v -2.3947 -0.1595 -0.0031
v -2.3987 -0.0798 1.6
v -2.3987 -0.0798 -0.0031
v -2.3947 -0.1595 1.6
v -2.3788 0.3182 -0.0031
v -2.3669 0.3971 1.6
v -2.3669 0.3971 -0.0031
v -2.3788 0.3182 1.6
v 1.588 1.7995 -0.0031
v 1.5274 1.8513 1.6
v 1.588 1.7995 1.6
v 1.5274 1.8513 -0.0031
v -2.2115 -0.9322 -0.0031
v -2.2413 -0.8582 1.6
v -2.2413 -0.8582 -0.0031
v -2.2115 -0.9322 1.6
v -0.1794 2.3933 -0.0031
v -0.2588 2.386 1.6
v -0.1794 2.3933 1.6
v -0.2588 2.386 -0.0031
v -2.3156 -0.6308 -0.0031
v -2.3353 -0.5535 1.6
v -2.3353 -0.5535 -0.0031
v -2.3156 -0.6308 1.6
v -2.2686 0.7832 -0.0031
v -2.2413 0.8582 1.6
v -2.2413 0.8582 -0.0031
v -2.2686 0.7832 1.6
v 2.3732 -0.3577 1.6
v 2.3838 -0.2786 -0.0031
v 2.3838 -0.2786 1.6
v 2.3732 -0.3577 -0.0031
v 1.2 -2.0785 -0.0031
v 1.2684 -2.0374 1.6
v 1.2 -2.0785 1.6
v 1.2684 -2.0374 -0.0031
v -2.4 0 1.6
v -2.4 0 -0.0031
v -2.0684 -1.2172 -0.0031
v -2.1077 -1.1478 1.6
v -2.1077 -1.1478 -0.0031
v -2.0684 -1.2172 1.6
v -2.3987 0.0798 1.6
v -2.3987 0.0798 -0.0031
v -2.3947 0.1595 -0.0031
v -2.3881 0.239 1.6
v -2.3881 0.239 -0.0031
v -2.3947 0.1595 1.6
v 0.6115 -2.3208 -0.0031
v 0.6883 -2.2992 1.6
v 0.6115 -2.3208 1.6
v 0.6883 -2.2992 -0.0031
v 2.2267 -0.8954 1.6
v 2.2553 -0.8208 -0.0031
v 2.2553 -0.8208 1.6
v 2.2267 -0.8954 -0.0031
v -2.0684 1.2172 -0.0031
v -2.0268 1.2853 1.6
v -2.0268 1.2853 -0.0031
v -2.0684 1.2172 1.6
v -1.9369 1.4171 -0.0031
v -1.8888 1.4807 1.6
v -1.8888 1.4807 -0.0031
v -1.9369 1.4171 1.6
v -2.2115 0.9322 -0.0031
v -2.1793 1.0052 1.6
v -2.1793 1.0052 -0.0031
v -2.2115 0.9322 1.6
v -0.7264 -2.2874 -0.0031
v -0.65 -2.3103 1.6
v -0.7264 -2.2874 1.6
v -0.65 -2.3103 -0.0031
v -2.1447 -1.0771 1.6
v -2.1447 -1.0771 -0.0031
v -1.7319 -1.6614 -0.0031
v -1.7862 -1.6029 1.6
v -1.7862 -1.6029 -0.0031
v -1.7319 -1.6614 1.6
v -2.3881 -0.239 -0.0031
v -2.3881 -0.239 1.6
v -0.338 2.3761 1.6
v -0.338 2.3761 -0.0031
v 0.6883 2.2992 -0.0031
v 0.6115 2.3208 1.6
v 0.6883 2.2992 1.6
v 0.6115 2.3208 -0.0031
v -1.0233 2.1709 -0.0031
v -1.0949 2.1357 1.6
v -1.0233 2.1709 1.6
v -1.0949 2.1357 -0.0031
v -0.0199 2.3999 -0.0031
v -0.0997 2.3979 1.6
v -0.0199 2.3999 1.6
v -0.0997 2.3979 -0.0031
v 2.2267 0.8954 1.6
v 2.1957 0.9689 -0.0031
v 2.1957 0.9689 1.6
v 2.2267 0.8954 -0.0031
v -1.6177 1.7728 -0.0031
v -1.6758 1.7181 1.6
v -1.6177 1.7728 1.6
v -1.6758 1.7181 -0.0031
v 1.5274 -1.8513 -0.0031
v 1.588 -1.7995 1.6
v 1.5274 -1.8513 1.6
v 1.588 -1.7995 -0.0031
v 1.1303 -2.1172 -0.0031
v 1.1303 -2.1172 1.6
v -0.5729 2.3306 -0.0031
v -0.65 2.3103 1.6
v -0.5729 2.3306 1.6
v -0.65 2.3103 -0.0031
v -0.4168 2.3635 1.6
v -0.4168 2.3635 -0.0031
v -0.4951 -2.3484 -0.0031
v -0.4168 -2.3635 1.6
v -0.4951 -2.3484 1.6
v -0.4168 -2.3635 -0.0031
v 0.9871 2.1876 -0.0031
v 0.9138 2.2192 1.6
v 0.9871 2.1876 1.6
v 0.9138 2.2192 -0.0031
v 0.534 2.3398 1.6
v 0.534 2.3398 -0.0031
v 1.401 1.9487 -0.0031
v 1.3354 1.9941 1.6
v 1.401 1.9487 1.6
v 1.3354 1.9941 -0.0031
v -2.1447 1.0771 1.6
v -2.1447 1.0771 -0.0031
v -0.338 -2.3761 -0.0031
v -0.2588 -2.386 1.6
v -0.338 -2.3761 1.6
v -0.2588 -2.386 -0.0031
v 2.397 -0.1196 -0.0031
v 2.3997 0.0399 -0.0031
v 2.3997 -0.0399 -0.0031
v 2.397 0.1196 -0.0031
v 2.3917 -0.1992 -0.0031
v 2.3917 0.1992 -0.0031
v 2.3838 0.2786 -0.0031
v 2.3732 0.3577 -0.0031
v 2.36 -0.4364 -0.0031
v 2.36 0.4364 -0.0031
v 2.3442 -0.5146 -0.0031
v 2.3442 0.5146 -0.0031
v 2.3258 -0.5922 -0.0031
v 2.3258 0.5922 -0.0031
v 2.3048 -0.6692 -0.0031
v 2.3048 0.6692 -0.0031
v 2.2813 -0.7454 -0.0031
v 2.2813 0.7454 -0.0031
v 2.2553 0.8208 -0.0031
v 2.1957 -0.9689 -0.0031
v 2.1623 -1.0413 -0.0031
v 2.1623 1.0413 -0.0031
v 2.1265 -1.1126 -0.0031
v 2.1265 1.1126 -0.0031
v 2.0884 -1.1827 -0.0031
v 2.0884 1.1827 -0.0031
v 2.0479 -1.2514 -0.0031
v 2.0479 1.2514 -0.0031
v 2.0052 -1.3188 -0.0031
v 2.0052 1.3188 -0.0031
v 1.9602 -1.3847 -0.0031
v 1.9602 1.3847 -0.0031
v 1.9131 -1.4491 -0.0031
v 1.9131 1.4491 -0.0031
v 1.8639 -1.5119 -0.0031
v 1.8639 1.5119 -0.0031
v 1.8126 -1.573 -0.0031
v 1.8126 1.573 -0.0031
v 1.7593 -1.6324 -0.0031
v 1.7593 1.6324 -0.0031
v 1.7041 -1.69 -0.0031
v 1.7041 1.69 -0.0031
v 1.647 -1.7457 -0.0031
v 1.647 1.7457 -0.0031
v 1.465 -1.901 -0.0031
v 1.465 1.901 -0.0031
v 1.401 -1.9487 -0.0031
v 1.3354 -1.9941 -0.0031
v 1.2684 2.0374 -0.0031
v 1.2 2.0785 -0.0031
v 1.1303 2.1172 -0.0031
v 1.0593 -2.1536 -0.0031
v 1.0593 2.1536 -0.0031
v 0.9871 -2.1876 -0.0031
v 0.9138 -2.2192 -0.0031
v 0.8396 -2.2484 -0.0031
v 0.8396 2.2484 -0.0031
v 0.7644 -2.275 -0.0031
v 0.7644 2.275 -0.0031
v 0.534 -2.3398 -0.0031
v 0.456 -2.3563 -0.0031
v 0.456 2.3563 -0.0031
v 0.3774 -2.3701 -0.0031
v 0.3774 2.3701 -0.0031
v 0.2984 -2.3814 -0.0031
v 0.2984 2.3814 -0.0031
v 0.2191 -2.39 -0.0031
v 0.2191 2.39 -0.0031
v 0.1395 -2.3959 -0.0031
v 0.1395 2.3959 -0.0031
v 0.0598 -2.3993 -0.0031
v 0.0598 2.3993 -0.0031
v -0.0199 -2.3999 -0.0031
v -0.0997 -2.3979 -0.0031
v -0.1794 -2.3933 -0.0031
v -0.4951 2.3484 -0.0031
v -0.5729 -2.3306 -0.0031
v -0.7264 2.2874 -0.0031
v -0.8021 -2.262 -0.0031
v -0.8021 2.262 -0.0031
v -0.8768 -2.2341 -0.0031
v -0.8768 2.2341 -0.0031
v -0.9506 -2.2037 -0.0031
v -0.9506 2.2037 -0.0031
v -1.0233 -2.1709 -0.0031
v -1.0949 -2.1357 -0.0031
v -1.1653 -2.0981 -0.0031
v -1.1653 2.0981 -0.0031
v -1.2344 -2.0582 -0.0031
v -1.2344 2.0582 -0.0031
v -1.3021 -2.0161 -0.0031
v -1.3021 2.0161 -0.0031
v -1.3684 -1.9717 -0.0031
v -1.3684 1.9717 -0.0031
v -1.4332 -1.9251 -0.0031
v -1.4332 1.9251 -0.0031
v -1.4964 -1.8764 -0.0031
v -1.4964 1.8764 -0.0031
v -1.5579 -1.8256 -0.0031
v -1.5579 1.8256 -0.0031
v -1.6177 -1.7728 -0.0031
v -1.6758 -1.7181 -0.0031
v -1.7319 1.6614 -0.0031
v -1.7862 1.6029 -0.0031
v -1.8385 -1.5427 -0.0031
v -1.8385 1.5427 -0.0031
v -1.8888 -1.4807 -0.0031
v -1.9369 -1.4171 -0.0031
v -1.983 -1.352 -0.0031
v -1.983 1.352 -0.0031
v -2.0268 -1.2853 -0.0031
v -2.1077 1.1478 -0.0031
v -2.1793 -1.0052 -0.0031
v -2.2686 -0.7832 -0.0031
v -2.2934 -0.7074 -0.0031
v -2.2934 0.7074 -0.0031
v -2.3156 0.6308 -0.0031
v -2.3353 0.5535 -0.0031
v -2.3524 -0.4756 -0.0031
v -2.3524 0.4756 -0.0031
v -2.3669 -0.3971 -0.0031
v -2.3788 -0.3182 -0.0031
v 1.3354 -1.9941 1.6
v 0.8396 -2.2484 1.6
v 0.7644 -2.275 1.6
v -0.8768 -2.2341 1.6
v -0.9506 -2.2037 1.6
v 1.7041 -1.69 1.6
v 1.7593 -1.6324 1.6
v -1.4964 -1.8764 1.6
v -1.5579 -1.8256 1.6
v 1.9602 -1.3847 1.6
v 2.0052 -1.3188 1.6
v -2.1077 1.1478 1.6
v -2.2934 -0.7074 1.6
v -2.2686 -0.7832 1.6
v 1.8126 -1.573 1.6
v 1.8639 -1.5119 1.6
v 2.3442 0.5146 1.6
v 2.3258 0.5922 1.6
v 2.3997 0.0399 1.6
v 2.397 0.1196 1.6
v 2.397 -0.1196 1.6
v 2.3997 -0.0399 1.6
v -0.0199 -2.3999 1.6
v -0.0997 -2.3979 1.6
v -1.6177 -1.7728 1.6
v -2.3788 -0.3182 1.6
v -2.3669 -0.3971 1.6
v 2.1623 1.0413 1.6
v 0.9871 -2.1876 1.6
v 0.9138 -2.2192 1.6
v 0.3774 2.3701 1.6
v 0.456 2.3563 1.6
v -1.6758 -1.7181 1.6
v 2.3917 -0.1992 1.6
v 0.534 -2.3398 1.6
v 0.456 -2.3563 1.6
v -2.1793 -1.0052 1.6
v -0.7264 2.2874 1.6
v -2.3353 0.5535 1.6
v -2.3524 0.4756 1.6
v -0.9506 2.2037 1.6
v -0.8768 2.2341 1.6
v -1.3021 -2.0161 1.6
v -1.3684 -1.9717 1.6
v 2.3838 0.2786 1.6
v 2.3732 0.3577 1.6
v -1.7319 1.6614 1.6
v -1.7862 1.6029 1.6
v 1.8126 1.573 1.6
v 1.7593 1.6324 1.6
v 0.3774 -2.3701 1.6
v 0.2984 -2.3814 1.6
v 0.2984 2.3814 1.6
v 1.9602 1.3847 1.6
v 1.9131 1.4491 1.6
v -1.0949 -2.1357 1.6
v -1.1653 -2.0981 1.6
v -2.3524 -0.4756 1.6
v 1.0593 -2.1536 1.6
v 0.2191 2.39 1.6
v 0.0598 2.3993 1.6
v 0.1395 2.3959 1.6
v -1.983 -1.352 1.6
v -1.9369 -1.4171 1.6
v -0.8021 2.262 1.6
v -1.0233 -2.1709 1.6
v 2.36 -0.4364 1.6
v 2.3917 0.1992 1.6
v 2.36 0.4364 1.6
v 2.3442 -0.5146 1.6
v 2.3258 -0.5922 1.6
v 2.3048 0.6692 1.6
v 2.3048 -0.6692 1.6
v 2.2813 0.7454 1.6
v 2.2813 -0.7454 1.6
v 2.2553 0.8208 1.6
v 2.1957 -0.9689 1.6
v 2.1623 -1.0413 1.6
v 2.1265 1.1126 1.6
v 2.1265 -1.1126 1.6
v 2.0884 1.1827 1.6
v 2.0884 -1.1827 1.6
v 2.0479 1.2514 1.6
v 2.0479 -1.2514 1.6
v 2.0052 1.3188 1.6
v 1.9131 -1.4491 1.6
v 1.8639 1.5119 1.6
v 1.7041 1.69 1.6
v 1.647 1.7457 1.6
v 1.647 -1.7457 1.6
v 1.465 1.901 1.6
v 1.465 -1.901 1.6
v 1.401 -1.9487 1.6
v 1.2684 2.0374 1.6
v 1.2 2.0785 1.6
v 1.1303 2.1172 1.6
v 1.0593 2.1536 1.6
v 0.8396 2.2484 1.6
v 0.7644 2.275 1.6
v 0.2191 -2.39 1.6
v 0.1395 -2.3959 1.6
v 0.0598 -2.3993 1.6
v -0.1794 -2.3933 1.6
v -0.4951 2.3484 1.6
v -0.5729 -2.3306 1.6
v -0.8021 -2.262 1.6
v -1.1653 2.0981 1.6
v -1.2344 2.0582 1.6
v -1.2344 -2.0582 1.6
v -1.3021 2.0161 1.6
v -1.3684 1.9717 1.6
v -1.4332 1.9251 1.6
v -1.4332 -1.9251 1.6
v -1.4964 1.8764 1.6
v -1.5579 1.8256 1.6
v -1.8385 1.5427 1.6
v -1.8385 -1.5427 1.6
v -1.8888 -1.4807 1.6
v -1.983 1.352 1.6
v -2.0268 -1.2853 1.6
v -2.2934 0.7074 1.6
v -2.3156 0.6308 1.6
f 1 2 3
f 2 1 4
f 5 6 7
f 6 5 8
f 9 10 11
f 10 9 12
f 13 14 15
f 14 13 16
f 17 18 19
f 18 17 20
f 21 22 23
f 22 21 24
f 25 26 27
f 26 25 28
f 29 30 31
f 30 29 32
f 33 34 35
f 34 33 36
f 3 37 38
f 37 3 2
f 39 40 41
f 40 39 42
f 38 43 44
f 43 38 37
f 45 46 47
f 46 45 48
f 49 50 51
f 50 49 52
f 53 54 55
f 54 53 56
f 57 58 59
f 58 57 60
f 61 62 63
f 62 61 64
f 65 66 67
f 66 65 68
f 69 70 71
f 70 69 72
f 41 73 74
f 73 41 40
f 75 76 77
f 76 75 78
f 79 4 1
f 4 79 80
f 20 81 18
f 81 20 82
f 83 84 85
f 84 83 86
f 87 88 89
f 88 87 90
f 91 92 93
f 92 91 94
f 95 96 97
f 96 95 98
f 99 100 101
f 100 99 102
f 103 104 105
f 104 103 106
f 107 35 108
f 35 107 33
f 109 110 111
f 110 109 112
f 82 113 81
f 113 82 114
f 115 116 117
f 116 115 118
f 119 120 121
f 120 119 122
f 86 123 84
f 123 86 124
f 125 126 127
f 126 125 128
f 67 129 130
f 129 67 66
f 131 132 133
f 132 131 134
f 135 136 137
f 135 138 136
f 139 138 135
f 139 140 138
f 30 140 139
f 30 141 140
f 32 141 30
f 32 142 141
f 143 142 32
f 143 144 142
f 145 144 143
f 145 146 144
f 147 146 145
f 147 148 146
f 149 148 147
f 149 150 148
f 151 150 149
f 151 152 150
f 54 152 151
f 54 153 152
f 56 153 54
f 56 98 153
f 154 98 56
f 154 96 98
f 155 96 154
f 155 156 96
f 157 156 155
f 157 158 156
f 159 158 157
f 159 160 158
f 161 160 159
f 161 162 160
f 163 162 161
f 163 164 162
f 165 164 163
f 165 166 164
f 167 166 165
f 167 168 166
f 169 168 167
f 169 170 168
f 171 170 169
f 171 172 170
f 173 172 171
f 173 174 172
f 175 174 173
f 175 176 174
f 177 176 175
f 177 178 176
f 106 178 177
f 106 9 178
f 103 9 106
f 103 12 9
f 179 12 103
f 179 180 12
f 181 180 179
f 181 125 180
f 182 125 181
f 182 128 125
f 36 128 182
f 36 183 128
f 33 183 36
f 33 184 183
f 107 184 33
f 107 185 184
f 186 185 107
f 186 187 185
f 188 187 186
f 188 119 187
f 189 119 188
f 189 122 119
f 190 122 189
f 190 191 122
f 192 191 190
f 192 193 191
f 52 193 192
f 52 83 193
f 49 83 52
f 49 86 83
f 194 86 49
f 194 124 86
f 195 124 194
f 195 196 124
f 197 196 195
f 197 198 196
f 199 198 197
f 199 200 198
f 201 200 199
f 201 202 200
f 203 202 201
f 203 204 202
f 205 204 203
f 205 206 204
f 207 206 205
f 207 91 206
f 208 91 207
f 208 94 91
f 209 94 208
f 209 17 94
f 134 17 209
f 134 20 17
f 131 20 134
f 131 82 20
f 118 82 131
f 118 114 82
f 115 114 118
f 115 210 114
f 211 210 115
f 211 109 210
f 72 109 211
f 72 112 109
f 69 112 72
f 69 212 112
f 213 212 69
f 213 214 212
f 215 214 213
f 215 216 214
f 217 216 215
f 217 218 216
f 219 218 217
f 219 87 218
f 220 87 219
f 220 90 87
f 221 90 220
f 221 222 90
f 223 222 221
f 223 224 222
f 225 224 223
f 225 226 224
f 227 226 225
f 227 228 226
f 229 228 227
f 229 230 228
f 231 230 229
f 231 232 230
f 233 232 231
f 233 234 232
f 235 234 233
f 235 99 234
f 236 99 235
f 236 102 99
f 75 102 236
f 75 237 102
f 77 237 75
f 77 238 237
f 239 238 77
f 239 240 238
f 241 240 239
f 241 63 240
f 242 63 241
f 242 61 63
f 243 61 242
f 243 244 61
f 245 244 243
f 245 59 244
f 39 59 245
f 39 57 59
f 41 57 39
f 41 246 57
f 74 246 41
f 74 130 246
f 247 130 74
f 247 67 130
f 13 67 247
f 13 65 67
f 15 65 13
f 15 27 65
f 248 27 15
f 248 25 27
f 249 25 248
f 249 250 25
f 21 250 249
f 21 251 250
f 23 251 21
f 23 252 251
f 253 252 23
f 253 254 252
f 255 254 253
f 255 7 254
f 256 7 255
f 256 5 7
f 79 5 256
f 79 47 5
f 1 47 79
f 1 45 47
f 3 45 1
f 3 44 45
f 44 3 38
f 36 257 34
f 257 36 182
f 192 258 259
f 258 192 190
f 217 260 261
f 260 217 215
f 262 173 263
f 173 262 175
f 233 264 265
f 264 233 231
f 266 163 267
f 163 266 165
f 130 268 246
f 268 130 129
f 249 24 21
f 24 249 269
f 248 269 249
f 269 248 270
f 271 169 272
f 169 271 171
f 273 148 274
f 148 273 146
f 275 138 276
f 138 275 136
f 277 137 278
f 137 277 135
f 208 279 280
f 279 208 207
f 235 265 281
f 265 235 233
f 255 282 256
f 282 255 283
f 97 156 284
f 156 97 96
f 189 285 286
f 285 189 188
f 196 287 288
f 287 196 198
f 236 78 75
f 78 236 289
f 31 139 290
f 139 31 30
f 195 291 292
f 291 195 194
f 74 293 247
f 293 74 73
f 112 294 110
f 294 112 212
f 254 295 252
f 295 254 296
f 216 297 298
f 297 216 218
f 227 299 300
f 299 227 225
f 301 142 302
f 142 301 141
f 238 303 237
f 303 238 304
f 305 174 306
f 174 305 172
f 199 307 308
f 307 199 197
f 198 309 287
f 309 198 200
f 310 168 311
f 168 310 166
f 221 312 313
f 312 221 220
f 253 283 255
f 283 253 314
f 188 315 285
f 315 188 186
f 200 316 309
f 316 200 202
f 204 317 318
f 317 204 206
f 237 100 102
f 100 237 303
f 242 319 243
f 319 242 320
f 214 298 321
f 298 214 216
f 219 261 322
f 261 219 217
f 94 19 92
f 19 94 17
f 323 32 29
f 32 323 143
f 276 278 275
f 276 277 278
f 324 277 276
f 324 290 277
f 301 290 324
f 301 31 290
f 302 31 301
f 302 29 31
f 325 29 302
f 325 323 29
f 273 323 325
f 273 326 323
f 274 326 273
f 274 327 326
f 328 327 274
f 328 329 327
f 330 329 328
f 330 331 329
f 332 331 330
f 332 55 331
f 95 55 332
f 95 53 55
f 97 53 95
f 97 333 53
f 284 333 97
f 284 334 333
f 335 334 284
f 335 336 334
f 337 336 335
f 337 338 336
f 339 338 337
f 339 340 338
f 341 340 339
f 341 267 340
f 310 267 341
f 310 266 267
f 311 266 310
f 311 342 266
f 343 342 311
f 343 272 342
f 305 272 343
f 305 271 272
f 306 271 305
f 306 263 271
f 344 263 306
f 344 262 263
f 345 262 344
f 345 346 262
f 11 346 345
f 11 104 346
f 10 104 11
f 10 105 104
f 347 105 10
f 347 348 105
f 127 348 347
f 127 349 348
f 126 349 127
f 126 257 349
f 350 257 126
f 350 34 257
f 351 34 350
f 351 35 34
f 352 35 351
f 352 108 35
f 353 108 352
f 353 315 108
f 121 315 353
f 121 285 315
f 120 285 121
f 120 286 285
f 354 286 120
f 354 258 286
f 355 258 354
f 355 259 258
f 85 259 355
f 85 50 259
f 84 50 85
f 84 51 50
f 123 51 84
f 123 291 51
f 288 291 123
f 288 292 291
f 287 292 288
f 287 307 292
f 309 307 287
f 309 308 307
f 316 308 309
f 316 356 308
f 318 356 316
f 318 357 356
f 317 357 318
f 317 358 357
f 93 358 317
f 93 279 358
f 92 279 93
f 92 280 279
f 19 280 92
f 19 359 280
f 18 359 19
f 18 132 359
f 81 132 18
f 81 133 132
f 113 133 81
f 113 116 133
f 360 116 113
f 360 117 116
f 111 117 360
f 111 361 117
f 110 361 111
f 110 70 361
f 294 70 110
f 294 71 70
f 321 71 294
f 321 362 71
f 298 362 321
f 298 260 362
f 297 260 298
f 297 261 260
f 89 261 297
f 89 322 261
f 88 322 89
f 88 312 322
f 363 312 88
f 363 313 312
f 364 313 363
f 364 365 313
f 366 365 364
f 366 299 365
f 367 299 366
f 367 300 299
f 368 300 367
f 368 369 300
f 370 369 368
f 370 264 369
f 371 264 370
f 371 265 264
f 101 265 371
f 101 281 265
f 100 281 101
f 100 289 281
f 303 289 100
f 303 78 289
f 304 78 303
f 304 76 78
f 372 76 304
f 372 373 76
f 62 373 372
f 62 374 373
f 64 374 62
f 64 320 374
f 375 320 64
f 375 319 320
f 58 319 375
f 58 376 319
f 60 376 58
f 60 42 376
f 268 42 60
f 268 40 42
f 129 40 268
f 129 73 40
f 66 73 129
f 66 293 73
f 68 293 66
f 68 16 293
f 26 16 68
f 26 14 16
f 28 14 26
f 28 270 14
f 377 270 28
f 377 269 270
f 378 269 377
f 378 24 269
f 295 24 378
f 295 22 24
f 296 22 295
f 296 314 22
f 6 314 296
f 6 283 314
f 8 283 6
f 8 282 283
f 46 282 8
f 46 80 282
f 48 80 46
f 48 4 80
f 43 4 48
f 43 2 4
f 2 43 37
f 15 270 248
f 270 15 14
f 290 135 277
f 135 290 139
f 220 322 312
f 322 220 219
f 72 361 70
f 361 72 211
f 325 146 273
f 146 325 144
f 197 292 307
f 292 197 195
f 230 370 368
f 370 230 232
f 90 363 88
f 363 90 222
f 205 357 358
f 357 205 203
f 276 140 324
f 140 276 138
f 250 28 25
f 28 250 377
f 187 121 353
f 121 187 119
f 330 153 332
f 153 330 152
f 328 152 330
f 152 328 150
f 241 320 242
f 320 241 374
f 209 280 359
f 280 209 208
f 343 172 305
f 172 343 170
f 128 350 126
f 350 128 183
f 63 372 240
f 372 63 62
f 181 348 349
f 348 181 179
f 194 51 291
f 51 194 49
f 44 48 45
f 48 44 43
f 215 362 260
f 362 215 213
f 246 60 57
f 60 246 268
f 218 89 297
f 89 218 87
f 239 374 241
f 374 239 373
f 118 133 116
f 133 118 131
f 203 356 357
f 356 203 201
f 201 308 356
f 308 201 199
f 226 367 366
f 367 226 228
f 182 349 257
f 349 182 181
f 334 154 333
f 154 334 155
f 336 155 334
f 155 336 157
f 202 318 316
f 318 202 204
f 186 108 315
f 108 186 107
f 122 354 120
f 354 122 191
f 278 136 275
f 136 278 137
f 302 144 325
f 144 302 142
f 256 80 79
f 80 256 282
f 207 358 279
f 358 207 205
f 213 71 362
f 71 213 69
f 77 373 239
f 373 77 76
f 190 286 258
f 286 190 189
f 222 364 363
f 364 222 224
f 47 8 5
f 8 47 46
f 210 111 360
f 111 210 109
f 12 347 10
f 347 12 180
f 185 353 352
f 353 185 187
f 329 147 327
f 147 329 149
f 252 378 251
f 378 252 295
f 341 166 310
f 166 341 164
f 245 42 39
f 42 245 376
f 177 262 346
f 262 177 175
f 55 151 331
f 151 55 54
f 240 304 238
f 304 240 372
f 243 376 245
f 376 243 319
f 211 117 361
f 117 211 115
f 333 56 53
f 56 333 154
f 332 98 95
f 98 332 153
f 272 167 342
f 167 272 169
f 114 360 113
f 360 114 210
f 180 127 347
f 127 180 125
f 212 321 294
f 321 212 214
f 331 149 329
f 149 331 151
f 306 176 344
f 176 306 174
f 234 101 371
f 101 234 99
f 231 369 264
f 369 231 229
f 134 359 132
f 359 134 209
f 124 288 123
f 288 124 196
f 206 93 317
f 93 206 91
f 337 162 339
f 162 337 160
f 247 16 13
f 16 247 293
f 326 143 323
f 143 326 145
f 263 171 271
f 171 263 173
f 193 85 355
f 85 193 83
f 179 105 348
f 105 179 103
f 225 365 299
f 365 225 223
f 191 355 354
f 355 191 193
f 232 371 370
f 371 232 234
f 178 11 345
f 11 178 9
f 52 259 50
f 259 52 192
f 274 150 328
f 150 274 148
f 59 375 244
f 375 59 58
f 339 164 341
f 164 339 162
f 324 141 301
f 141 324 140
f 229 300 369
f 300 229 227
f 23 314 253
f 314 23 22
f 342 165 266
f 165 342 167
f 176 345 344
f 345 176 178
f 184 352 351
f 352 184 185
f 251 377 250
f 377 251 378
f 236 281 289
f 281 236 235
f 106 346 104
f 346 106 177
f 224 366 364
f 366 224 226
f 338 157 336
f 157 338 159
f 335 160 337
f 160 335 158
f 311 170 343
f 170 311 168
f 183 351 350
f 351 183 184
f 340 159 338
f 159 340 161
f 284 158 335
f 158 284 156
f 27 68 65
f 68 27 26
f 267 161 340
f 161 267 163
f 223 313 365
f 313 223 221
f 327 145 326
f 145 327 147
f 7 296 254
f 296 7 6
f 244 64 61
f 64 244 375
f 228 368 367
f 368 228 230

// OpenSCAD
use <../../lib.scad>
use <../../p/box2-5.scad>
use <../../p/box5.scad>
use <../../p/rect.scad>
use <../../p/rect3.scad>
use <../../p/stud.scad>
use <../../p/stud2a.scad>
use <../../p/stud2s.scad>
$fa=1; $fs=0.2;
function ldraw_lib__s__3665as01(realsolid=false) = [
// 0 ~Slope Brick 45  2 x  1 Inverted without Inner Stopper Ring and Front Face
// 0 Name: s\3665as01.dat
// 0 Author: Michael Heidemann [mikeheide]
// 0 !LDRAW_ORG Subpart UPDATE 2018-02
// 0 !LICENSE Licensed under CC BY 2.0 and CC BY 4.0 : see CAreadme.txt
// 
// 0 BFC CERTIFY CW
  [0,"BFC","CERTIFY"],
  [0,"BFC","CW"],
// 
// 0 !HISTORY 2008-07-11 [mkennedy] Made use of stud2s and more box and rect primitives.
// 0 !HISTORY 2010-05-18 [Steffen] corrected stud orientation
// 0 !HISTORY 2010-07-05 [PTadmin] Official Update 2010-02
// 0 !HISTORY 2016-01-11 [PTadmin] Renamed from s/3665s01
// 0 !HISTORY 2018-12-08 [PTadmin] Official Update 2018-02
// 
// 
// 0 BFC INVERTNEXT
  [0,"BFC","INVERTNEXT"],
// 1 16 0 24 0 6 0 0 0 -20 0 0 0 6 box5.dat
  [1,16,0,24,0,6,0,0,0,-20,0,0,0,6, ldraw_lib__box5(realsolid)],
// 4 16 -10 24 10 -6 24 6 6 24 6 10 24 10
  [4,16,-10,24,10,-6,24,6,6,24,6,10,24,10],
// 4 16 -10 24 -10 -6 24 -6 -6 24 6 -10 24 10
  [4,16,-10,24,-10,-6,24,-6,-6,24,6,-10,24,10],
// 4 16 10 24 -10 6 24 -6 -6 24 -6 -10 24 -10
  [4,16,10,24,-10,6,24,-6,-6,24,-6,-10,24,-10],
// 4 16 10 24 10 6 24 6 6 24 -6 10 24 -10
  [4,16,10,24,10,6,24,6,6,24,-6,10,24,-10],
// 2 24 10 24 -10 10 24 10
  [2,24,10,24,-10,10,24,10],
// 2 24 10 24 -10 -10 24 -10
  [2,24,10,24,-10,-10,24,-10],
// 2 24 -10 24 -10 -10 24 10
  [2,24,-10,24,-10,-10,24,10],
// 2 24 10 4 -30 10 24 -10
  [2,24,10,4,-30,10,24,-10],
// 2 24 -10 4 -30 -10 24 -10
  [2,24,-10,4,-30,-10,24,-10],
// 2 24 10 0 -30 10 0 10
  [2,24,10,0,-30,10,0,10],
// 2 24 -10 0 -30 -10 0 10
  [2,24,-10,0,-30,-10,0,10],
// 2 24 -8 0 -10 -8 0 -26
  [2,24,-8,0,-10,-8,0,-26],
// 2 24 8 0 -26 8 0 -10
  [2,24,8,0,-26,8,0,-10],
// 0 BFC INVERTNEXT
  [0,"BFC","INVERTNEXT"],
// 1 16 0 10 -18 8 0 0 0 2 -8 0 0 -8 box2-5.dat
  [1,16,0,10,-18,8,0,0,0,2,-8,0,0,-8, ldraw_lib__box2_5(realsolid)],
// 4 16 10 24 10 10 24 -10 10 4 -30 10 0 10
  [4,16,10,24,10,10,24,-10,10,4,-30,10,0,10],
// 3 16 10 0 10 10 4 -30 10 0 -30
  [3,16,10,0,10,10,4,-30,10,0,-30],
// 1 16 0 12 10 10 0 0 0 0 12 0 -1 0 rect.dat
  [1,16,0,12,10,10,0,0,0,0,12,0,-1,0, ldraw_lib__rect(realsolid)],
// 4 16 -10 24 10 -10 0 10 -10 4 -30 -10 24 -10
  [4,16,-10,24,10,-10,0,10,-10,4,-30,-10,24,-10],
// 3 16 -10 0 -30 -10 4 -30 -10 0 10
  [3,16,-10,0,-30,-10,4,-30,-10,0,10],
// 1 16 0 2 -30 10 0 0 0 0 2 0 1 0 rect.dat
  [1,16,0,2,-30,10,0,0,0,0,2,0,1,0, ldraw_lib__rect(realsolid)],
// 4 16 8 4 -26 8 20 -10 8 0 -10 8 0 -26
  [4,16,8,4,-26,8,20,-10,8,0,-10,8,0,-26],
// 4 16 -8 4 -26 -8 0 -26 -8 0 -10 -8 20 -10
  [4,16,-8,4,-26,-8,0,-26,-8,0,-10,-8,20,-10],
// 1 16 0 10 -10 8 0 0 0 0 -10 0 1 0 rect3.dat
  [1,16,0,10,-10,8,0,0,0,0,-10,0,1,0, ldraw_lib__rect3(realsolid)],
// 4 16 -10 0 10 10 0 10 8 0 -10 -8 0 -10
  [4,16,-10,0,10,10,0,10,8,0,-10,-8,0,-10],
// 4 16 -10 0 -30 -10 0 10 -8 0 -10 -8 0 -26
  [4,16,-10,0,-30,-10,0,10,-8,0,-10,-8,0,-26],
// 4 16 10 0 -30 -10 0 -30 -8 0 -26 8 0 -26
  [4,16,10,0,-30,-10,0,-30,-8,0,-26,8,0,-26],
// 4 16 10 0 10 10 0 -30 8 0 -26 8 0 -10
  [4,16,10,0,10,10,0,-30,8,0,-26,8,0,-10],
// 1 16 0 0 0 0 0 1 0 1 0 -1 0 0 stud.dat
  [1,16,0,0,0,0,0,1,0,1,0,-1,0,0, ldraw_lib__stud(realsolid)],
// 1 16 0 4 -20 1 0 0 0 2 0 0 0 1 stud2a.dat
  [1,16,0,4,-20,1,0,0,0,2,0,0,0,1, ldraw_lib__stud2a(realsolid)],
// 1 16 0 4 -20 0 0 1 0 6 0 -1 0 0 stud2s.dat
  [1,16,0,4,-20,0,0,1,0,6,0,-1,0,0, ldraw_lib__stud2s(realsolid)],
];
module ldraw_lib__s__3665as01(step=0, col=false, unit=2/5, alt=false, line=0.2, solid=!$preview)
    makepoly(ldraw_lib__s__3665as01(solid), step=step, col=col, unit=unit, alt=alt, line=line, solid=solid);
ldraw_lib__s__3665as01(line=0.2);
